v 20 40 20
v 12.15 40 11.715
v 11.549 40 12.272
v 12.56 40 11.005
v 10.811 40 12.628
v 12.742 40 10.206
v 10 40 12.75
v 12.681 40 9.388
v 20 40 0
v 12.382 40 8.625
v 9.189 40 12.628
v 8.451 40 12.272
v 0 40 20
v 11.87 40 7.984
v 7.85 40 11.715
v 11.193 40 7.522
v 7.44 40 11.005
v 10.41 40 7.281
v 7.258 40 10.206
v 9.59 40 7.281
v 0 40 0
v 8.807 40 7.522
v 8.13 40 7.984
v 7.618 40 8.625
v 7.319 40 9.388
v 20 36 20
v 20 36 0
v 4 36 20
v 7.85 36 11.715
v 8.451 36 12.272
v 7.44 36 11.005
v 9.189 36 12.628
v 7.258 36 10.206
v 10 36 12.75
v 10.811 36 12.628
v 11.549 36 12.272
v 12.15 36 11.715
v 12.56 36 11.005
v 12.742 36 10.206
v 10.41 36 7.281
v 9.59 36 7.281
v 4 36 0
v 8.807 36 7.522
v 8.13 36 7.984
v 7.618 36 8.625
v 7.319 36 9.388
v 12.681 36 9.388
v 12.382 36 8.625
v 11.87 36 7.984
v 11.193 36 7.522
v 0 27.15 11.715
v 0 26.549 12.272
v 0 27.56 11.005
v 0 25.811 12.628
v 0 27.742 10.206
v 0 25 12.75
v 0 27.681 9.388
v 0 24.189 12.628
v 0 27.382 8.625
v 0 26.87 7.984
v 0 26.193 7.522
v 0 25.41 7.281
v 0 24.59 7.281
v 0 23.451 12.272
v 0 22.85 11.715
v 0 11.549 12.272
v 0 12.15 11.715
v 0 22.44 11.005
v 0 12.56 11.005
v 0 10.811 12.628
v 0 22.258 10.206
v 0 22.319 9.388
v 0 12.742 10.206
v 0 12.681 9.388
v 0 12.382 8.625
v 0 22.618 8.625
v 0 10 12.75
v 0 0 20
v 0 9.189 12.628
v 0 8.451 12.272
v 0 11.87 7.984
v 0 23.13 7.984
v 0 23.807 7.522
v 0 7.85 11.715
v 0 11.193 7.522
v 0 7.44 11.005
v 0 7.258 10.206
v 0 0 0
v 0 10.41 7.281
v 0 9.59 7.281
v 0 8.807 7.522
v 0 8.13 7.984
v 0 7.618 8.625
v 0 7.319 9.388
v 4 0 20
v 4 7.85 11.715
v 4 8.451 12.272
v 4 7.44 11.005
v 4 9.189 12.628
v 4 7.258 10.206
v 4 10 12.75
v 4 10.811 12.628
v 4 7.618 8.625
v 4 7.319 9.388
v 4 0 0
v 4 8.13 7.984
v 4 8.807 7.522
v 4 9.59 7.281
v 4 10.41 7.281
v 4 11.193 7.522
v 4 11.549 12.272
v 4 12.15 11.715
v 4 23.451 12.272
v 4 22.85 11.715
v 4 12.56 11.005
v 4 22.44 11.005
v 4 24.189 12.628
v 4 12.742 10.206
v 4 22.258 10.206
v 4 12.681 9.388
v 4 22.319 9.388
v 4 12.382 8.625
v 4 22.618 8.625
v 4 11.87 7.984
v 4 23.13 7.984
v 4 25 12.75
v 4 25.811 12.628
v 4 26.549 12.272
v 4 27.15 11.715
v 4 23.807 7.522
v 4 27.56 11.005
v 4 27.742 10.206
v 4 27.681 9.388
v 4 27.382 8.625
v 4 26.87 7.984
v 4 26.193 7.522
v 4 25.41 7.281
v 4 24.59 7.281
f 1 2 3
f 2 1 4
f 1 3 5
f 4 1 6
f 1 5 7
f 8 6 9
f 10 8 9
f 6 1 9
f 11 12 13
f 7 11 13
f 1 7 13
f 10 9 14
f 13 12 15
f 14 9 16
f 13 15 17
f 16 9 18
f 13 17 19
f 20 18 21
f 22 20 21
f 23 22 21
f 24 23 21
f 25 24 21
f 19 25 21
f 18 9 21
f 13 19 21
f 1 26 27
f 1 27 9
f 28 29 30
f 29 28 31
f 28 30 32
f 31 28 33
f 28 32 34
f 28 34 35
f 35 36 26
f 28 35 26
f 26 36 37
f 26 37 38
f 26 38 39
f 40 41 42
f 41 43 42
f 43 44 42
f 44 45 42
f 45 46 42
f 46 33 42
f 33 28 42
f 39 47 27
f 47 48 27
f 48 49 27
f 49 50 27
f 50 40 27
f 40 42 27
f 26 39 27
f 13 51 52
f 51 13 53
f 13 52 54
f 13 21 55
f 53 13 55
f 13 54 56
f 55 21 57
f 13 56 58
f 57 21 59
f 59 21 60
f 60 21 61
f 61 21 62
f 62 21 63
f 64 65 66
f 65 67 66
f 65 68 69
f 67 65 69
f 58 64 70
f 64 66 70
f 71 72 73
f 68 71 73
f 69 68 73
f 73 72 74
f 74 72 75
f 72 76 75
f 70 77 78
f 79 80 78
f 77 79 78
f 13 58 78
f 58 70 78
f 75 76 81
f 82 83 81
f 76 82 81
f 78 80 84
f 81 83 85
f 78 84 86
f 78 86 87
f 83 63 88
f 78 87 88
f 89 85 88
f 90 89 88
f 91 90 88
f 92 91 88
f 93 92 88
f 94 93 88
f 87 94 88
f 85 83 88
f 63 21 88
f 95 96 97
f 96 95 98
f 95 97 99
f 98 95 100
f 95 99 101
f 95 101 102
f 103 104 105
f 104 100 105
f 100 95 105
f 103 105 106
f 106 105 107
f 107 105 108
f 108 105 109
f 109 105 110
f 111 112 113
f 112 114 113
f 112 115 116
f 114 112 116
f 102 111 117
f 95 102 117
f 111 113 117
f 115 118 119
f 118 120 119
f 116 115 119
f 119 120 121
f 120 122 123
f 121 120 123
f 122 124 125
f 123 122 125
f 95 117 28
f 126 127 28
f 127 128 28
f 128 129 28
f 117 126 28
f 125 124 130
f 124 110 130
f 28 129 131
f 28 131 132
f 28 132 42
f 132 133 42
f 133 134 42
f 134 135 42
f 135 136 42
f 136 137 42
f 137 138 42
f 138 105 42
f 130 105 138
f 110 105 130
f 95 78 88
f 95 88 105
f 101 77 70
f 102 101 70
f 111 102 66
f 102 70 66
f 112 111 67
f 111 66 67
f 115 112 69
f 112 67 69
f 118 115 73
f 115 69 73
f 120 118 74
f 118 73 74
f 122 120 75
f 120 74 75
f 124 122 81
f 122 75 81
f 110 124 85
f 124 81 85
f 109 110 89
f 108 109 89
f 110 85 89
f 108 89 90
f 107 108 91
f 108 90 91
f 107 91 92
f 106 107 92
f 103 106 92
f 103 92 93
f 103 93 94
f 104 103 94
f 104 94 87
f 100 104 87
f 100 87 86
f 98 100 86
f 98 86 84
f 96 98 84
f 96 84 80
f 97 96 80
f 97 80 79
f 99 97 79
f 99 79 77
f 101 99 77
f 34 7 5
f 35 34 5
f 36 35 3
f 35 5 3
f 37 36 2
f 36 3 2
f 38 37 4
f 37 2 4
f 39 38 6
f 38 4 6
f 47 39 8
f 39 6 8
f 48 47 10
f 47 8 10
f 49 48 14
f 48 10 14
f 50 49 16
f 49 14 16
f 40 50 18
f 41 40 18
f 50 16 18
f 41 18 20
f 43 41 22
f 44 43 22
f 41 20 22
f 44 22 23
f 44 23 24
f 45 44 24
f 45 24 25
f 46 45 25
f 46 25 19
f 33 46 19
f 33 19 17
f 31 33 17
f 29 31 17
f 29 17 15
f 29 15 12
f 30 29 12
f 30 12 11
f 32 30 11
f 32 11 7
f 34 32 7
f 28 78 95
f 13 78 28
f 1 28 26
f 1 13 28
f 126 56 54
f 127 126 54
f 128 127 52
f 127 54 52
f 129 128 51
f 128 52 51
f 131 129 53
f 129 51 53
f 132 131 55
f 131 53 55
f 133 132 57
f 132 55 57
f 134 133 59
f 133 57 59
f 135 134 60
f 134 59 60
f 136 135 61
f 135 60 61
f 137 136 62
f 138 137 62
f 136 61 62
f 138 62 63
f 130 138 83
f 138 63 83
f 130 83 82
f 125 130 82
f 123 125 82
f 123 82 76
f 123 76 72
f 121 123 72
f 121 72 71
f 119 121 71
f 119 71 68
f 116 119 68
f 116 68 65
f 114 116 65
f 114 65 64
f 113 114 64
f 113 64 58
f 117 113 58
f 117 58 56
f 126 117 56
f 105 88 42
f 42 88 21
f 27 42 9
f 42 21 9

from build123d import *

# Parameters (mm, degrees)
BOSS_EXTRUDE1_DEPTH = 20
SKETCH2_R           = 2.75
CUT_EXTRUDE1_DEPTH  = 49.989794856
SKETCH3_R           = 2.75
CUT_EXTRUDE2_DEPTH  = 49.989794856


with BuildPart() as part:
    # Sketch1 → Boss-Extrude1 (new body)
    with BuildSketch(Plane.XY):
        Polygon((0, 0), (4, 0), (4, 36), (20, 36), (20, 40), (0, 40), align=None)
    extrude(amount=BOSS_EXTRUDE1_DEPTH)

    # Sketch2 → Cut-Extrude1 (cut, through all)
    with BuildSketch(Plane(origin=(0, 40, 0), x_dir=(1, 0, 0), z_dir=(0, 1, 0))):
        with Locations(Location((10, -10, 0), (0, 0, 270))):
            Circle(SKETCH2_R)
    extrude(amount=-CUT_EXTRUDE1_DEPTH, mode=Mode.SUBTRACT)

    # Sketch3 → Cut-Extrude2 (cut, through all)
    with BuildSketch(Plane.ZY):
        with Locations((10, 10)):
            Circle(SKETCH3_R)
        with Locations((10, 25)):
            Circle(SKETCH3_R)
    extrude(amount=-CUT_EXTRUDE2_DEPTH, mode=Mode.SUBTRACT)


solid = part.part
